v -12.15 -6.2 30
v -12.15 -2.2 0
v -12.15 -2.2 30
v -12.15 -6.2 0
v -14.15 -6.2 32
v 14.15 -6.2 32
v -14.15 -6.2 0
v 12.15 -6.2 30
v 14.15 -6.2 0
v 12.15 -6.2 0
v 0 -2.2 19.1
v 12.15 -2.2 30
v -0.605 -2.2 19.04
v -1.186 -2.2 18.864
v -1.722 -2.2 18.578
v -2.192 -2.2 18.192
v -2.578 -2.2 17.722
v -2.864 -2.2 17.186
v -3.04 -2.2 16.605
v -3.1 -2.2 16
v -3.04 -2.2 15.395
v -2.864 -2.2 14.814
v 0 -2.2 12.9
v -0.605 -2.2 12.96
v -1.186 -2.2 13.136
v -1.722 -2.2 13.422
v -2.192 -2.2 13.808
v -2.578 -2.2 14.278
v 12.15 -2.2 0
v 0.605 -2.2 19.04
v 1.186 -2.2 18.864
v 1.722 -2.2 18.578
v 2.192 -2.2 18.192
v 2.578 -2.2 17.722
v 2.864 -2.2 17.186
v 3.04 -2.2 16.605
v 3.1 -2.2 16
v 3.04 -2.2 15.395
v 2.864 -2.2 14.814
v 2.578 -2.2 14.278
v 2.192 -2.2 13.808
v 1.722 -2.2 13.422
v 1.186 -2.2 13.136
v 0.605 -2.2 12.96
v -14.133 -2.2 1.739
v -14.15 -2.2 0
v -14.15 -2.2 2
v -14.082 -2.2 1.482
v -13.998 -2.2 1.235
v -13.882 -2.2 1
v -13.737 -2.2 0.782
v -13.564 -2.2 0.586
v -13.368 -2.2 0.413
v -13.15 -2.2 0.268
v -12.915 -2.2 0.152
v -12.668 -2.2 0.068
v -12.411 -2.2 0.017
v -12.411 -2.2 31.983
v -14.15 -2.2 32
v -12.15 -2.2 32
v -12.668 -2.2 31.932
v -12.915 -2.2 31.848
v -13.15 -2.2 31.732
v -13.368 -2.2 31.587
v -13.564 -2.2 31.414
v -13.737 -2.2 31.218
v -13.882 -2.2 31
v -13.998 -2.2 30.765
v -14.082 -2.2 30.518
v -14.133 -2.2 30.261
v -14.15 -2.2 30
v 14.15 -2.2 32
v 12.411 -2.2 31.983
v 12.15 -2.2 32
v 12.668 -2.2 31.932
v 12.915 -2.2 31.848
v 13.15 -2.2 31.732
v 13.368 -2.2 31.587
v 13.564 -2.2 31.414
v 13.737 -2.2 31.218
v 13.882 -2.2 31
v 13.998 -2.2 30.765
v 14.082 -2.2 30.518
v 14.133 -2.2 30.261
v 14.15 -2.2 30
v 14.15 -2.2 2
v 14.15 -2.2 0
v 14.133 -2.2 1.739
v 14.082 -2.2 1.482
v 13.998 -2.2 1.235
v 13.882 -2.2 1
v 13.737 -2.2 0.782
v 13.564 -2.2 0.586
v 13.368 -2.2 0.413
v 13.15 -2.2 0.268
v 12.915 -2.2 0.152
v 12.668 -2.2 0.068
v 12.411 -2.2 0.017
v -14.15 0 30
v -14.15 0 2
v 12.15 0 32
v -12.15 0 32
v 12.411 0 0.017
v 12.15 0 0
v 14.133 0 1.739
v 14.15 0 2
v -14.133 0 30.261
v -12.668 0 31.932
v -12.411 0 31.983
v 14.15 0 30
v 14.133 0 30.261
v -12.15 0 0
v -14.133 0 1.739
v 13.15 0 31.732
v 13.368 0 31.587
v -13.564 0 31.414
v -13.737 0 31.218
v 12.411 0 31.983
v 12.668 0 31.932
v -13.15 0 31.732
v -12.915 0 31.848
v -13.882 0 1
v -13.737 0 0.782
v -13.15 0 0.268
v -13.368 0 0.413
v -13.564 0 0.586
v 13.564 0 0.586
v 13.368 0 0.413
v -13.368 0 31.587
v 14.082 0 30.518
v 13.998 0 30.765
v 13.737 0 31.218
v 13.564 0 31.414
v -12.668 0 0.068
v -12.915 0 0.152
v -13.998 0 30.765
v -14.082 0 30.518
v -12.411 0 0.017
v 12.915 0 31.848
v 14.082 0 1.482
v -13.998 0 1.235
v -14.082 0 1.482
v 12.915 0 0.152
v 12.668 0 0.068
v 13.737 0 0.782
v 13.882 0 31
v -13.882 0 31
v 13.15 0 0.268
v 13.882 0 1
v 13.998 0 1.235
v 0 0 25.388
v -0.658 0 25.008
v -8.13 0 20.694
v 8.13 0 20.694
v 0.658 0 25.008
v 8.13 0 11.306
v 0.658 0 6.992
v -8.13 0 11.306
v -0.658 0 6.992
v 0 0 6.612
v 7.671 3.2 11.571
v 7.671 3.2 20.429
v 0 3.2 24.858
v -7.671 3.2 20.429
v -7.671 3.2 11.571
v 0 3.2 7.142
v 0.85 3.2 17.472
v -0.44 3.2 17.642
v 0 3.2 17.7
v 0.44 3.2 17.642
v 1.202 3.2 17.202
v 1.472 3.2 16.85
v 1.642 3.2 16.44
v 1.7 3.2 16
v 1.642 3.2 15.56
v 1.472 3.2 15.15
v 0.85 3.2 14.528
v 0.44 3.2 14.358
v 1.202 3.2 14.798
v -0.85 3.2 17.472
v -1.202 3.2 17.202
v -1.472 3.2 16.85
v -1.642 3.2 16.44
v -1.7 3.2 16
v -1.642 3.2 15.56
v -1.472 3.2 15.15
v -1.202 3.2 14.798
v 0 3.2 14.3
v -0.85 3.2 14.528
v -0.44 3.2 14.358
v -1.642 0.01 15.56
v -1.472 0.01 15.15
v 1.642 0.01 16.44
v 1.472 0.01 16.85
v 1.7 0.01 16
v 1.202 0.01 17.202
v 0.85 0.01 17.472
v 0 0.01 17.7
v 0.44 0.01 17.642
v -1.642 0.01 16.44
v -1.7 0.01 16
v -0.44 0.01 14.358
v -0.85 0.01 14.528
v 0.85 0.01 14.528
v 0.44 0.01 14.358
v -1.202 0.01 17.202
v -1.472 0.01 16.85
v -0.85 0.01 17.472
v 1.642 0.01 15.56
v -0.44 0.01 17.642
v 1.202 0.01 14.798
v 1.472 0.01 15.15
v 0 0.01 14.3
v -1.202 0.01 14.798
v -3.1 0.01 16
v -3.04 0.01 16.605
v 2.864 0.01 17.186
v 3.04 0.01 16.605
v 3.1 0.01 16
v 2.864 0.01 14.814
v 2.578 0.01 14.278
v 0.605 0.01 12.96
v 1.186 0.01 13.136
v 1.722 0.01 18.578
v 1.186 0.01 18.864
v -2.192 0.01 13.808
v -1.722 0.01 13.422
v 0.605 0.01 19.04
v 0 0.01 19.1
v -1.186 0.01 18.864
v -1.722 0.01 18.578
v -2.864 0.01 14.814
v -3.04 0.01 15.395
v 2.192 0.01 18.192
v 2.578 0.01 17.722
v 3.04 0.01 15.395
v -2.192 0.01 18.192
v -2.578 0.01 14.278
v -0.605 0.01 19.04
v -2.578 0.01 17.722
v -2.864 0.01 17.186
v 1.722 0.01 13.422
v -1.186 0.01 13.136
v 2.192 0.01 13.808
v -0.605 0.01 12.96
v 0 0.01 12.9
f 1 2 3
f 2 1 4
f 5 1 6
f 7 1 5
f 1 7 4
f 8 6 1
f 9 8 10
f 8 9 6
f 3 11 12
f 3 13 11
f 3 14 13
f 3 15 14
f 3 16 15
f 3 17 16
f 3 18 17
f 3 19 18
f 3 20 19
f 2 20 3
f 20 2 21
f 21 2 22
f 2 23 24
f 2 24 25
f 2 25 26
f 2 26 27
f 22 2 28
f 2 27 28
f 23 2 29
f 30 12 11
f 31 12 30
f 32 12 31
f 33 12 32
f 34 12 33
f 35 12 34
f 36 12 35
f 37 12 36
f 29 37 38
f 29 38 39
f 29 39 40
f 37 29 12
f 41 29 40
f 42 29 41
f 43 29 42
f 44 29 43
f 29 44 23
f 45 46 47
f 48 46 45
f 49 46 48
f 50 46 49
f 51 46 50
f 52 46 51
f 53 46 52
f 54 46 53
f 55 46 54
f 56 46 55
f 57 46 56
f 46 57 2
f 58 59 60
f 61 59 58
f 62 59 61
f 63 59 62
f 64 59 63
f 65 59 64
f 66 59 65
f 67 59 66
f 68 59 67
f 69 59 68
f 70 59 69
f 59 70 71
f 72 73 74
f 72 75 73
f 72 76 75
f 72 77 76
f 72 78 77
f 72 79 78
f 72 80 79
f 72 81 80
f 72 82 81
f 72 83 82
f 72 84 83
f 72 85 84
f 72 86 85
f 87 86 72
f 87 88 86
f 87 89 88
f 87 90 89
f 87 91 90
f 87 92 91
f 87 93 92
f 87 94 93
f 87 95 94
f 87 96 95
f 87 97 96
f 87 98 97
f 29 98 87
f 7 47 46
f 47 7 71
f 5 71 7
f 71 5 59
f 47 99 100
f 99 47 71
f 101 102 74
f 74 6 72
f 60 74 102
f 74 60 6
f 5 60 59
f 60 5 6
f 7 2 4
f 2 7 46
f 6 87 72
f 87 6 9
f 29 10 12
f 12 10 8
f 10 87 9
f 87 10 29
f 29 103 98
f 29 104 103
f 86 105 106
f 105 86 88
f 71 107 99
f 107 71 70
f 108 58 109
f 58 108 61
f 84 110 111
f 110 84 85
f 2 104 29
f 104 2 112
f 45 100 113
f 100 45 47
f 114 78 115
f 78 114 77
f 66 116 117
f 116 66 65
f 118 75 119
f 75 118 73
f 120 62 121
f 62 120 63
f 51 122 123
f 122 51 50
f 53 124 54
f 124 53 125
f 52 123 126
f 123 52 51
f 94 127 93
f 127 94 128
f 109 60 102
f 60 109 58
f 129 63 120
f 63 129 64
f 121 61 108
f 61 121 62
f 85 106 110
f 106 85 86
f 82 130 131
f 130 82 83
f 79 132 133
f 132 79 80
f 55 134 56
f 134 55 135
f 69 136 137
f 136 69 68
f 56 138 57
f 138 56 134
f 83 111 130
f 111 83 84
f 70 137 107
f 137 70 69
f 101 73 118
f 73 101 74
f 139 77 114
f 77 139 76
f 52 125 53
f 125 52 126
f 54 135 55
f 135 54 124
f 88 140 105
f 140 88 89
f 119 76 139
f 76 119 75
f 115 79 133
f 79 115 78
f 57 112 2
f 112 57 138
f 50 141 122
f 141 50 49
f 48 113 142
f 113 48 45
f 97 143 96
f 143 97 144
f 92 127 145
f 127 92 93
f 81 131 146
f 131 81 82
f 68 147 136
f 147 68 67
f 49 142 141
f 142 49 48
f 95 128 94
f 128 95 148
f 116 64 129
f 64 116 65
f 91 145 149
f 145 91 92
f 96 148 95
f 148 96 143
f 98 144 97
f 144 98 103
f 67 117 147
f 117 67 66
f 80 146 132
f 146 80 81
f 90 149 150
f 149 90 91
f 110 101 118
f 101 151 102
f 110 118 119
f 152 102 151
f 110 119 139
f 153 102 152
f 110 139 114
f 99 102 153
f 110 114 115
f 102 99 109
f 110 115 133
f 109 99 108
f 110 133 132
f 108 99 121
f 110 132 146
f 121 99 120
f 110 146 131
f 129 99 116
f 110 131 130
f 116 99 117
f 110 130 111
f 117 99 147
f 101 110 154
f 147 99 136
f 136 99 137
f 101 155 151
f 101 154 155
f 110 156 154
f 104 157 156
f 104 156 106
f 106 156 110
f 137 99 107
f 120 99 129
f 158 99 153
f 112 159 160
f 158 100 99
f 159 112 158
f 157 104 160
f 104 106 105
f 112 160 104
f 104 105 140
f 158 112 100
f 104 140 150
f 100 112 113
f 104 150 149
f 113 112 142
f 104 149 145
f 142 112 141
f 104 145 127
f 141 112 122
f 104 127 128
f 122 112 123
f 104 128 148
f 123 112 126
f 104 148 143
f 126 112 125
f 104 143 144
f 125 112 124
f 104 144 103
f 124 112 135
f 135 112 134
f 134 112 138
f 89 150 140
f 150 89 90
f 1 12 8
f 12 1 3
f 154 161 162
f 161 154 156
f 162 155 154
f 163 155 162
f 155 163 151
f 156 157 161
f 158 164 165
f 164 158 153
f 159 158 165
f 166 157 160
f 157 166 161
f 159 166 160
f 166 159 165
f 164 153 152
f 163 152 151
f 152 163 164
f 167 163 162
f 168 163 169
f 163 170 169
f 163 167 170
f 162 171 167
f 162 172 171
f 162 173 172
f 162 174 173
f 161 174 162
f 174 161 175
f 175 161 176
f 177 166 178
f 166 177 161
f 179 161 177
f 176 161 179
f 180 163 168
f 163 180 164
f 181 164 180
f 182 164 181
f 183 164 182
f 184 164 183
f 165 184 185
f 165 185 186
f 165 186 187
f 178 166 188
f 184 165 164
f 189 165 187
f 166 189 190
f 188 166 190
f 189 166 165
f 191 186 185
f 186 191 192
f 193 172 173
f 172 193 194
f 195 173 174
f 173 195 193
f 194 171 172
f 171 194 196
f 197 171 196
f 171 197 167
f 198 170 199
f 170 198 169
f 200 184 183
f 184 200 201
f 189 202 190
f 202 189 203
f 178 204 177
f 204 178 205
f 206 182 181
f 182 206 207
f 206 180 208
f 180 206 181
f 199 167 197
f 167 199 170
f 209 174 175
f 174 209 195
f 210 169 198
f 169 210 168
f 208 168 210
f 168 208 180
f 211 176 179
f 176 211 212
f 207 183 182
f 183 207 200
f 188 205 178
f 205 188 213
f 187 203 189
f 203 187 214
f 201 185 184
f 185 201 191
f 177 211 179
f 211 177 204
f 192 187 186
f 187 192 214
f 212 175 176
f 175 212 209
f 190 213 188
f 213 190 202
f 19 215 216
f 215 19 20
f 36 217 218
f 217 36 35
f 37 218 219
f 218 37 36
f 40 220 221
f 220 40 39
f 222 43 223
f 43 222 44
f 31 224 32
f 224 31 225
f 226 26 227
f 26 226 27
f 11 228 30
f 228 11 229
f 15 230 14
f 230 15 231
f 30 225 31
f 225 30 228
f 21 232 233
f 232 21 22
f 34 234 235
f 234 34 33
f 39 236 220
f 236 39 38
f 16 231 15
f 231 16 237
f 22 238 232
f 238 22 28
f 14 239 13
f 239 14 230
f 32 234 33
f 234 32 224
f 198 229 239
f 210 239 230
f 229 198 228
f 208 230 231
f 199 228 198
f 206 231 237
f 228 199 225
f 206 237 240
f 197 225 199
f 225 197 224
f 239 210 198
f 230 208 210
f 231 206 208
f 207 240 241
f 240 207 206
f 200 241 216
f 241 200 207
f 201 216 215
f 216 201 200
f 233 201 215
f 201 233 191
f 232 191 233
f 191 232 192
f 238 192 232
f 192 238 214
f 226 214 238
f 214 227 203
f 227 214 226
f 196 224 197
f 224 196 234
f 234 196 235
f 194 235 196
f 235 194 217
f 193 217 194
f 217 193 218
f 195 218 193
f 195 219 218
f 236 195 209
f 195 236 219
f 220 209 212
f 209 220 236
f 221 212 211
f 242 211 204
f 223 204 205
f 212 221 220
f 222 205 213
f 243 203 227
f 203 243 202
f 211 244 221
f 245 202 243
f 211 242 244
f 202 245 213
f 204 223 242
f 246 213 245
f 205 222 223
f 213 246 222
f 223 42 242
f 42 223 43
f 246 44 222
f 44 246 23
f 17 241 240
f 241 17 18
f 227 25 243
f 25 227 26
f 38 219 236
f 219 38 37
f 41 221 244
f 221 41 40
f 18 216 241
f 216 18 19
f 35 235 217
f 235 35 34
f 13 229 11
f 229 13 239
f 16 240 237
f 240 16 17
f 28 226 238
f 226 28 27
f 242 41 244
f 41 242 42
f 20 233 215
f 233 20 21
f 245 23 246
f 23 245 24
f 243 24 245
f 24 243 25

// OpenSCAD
// file: rm_common.scad
// RobotMind V1 mechanical standard. All dimensions are millimetres.
$fn = 48;

RM_UNIT = 40;
RM_PLATE_T = 12;
RM_FIT = 0; // positive is looser; tune in 0.05 mm steps

// One carrier joint: a progressive hex press fit plus an optional M3 lock.
RM_SOCKET_DEPTH = 3.4;
RM_HEX_AF = 16;
RM_HEX_R = RM_HEX_AF/sqrt(3);
RM_HEX_TAPER = 0.28;
RM_HEX_ENTRY_CLEARANCE = 0.10+RM_FIT;
RM_HEX_GRIP = 0.20-RM_FIT;
RM_HEX_PITCH = 20;
RM_HEX_X = RM_HEX_PITCH;
RM_HEX_Y = sqrt(3)/2*RM_HEX_PITCH;

// Plate-to-plate 90° box joint: integral tabs enter open edge slots.
RM_JOIN_PITCH = 10;
RM_JOIN_LENGTH = 3.0;
RM_JOIN_W = 6;
RM_JOIN_CLEARANCE = 0.06+RM_FIT;
RM_M3_CLEARANCE = 3.4;
RM_M3_PILOT = 2.6;
RM_M3_HEAD = 6.2;
RM_M3_INSERT_HOLE = 4.0; // tune for the chosen M3 heat-set insert
RM_M3_INSERT_LENGTH = 5.0;
RM_M3_MEMBRANE = 0.3;
RM_M3_BLIND_DEPTH =
  (RM_PLATE_T-2*RM_SOCKET_DEPTH-RM_M3_MEMBRANE)/2;

assert(RM_PLATE_T > 2 * RM_SOCKET_DEPTH,
       "Plate needs a solid web between its two carrier sockets");
assert(RM_HEX_ENTRY_CLEARANCE >= 0 && RM_HEX_GRIP > 0 &&
       RM_JOIN_CLEARANCE >= 0,
       "RM_FIT is outside the printable range");
assert(RM_M3_BLIND_DEPTH > 0,
       "Plate is too thin for double-sided M3 insert pockets");
assert(2*RM_M3_BLIND_DEPTH+RM_M3_MEMBRANE >= RM_M3_INSERT_LENGTH,
       "Plate web is too thin for the M3 insert");

module rounded_box(size=[20,20,3], r=2, center=false) {
  x=size[0]; y=size[1]; z=size[2];
  translate(center ? [-x/2,-y/2,-z/2] : [0,0,0])
    linear_extrude(height=z)
      offset(r=r) offset(delta=-r) square([x,y]);
}

module print_on_x_edge(span) {
  translate([0,0,span/2]) rotate([0,90,0]) children();
}

module print_on_y_edge(span) {
  translate([0,0,span/2]) rotate([90,0,0]) children();
}

module hex_frustum(r1=RM_HEX_R, r2=RM_HEX_R, h=1) {
  rotate([0,0,30]) cylinder(r1=r1,r2=r2,h=h,$fn=6);
}

module top_socket_cut() {
  union() {
    translate([0,0,RM_PLATE_T-RM_SOCKET_DEPTH])
      hex_frustum(RM_HEX_R-RM_HEX_TAPER,
                   RM_HEX_R,
                   RM_SOCKET_DEPTH+0.1);
    translate([0,0,RM_PLATE_T-RM_SOCKET_DEPTH-RM_M3_BLIND_DEPTH])
      cylinder(h=RM_M3_BLIND_DEPTH+0.1,d=RM_M3_INSERT_HOLE,$fn=24);
  }
}

module bottom_socket_cut() {
  union() {
    translate([0,0,-0.1])
      hex_frustum(RM_HEX_R,
                   RM_HEX_R-RM_HEX_TAPER,
                   RM_SOCKET_DEPTH+0.1);
    translate([0,0,RM_SOCKET_DEPTH-0.1])
      cylinder(h=RM_M3_BLIND_DEPTH+0.1,d=RM_M3_INSERT_HOLE,$fn=24);
  }
}

module socket_pair() {
  top_socket_cut();
  bottom_socket_cut();
}

// Triangular lattice. Female edges reserve enough material for corner slots;
// the 5.5 mm origin shift keeps the 20 mm pitch and centers the usable area.
module dense_socket_grid(size=[2*RM_UNIT,2*RM_UNIT]) {
  rows=ceil(size[1]/RM_HEX_Y)+2;
  cols=ceil(size[0]/RM_HEX_X)+2;
  female_margin=RM_PLATE_T+1;
  male_margin=2;
  origin=(female_margin-male_margin)/2;
  for(row=[-rows:rows], col=[-cols:cols]) {
    y=origin+row*RM_HEX_Y;
    x=origin+(col + ((abs(row)%2)==1 ? 0.5 : 0))*RM_HEX_X;
    if(x-RM_HEX_AF/2 >= -size[0]/2+female_margin &&
       x+RM_HEX_AF/2 <= size[0]/2-male_margin &&
       y-RM_HEX_R >= -size[1]/2+female_margin &&
       y+RM_HEX_R <= size[1]/2-male_margin)
      translate([x,y,0]) socket_pair();
  }
}

function join_index(p,edge_len) =
  round((p+edge_len/2-RM_JOIN_PITCH/2)/RM_JOIN_PITCH);
function is_m3_join(p,edge_len) = join_index(p,edge_len)%4 == 1;

// Integral rectangular tabs on an A edge (+Y in local coordinates).
module male_edge(edge_len, plate_half) {
  for(p=[-edge_len/2+RM_JOIN_PITCH/2:
         RM_JOIN_PITCH:
         edge_len/2-RM_JOIN_PITCH/2])
    translate([p-RM_JOIN_W/2,plate_half-0.05,0])
      cube([RM_JOIN_W,RM_JOIN_LENGTH+0.05,RM_PLATE_T]);
}

// Blind thread-forming pilots continue through selected tabs into the edge.
module male_edge_m3_cuts(edge_len, plate_half) {
  for(p=[-edge_len/2+RM_JOIN_PITCH/2:
         RM_JOIN_PITCH:
         edge_len/2-RM_JOIN_PITCH/2])
    if(is_m3_join(p,edge_len))
      translate([p,plate_half-4,RM_PLATE_T/2])
        rotate([-90,0,0])
          cylinder(h=RM_JOIN_LENGTH+4.2,d=RM_M3_PILOT,$fn=24);
}

// Female B edge (-Y): open slots accept tabs from either face at 90°.
module female_edge_cuts(edge_len, plate_half) {
  for(p=[-edge_len/2+RM_JOIN_PITCH/2:
         RM_JOIN_PITCH:
         edge_len/2-RM_JOIN_PITCH/2]) {
    translate([p-RM_JOIN_W/2-RM_JOIN_CLEARANCE,
               -plate_half-0.1,-0.1])
      cube([RM_JOIN_W+2*RM_JOIN_CLEARANCE,
            RM_PLATE_T+RM_JOIN_CLEARANCE,
            RM_JOIN_LENGTH+0.1]);
    translate([p-RM_JOIN_W/2-RM_JOIN_CLEARANCE,
               -plate_half-0.1,RM_PLATE_T-RM_JOIN_LENGTH])
      cube([RM_JOIN_W+2*RM_JOIN_CLEARANCE,
            RM_PLATE_T+RM_JOIN_CLEARANCE,
            RM_JOIN_LENGTH+0.1]);
    if(is_m3_join(p,edge_len)) {
      translate([p,-plate_half+RM_PLATE_T/2,-0.1])
        cylinder(h=RM_PLATE_T+0.2,d=RM_M3_CLEARANCE,$fn=24);
    }
  }
}

// Identical plates: tabs on +X/+Y and 90° slots on -X/-Y.
module plate(size=[2*RM_UNIT,2*RM_UNIT]) {
  assert(size[0] % RM_UNIT == 0 && size[1] % RM_UNIT == 0,
         "Plate dimensions must be whole 40 mm units");
  difference() {
    union() {
      translate([-size[0]/2,-size[1]/2,0])
        rounded_box([size[0],size[1],RM_PLATE_T],1.5);
      male_edge(size[0],size[1]/2);
      rotate([0,0,-90]) male_edge(size[1],size[0]/2);
    }
    dense_socket_grid(size);
    female_edge_cuts(size[0],size[1]/2);
    rotate([0,0,-90]) female_edge_cuts(size[1],size[0]/2);
    male_edge_m3_cuts(size[0],size[1]/2);
    rotate([0,0,-90]) male_edge_m3_cuts(size[1],size[0]/2);
  }
}

// The tip enters freely; the last fraction of travel supplies the grip.
module integral_hex_plug() {
  translate([0,0,-RM_SOCKET_DEPTH+0.2])
    hex_frustum(RM_HEX_R-RM_HEX_TAPER-RM_HEX_ENTRY_CLEARANCE,
                 RM_HEX_R+RM_HEX_GRIP,
                 RM_SOCKET_DEPTH+0.1);
}

// Adds the universal plug. M3 is optional: the press fit works alone.
module carrier_mount() {
  difference() {
    union() {
      children();
      integral_hex_plug();
    }
    translate([0,0,-RM_SOCKET_DEPTH])
      cylinder(h=RM_SOCKET_DEPTH+100,d=RM_M3_CLEARANCE,$fn=24);
    translate([0,0,-0.01])
      cylinder(h=2.21,d=RM_M3_HEAD,$fn=32);
  }
}

module sensor_carrier(pcb=[20,20], wall=1.7, floor=1.8, clearance=0.5) {
  W=pcb[0]+2*(wall+clearance);
  L=pcb[1]+2*(wall+clearance);
  assert(W >= 2*(RM_HEX_R+RM_HEX_GRIP),
         "Carrier is narrower than its integral hex plug");
  carrier_mount() union() {
    translate([-W/2,-L/2,0]) difference() {
      rounded_box([W,L,floor+3.1],2);
      translate([wall,wall,floor])
        rounded_box([pcb[0]+2*clearance,pcb[1]+2*clearance,5],1);
      translate([W/2-6,-0.2,floor+0.5]) cube([12,wall+1,3.5]);
    }
    for(x=[-W/2+2.2,W/2-2.2], y=[-L/2+2.2,L/2-2.2])
      translate([x,y,floor+2.5]) cylinder(h=1.3,d=2.2);
  }
}

module tag_insert(tag=[60,60], border=3, t=1) {
  W=tag[0]+2*border; H=tag[1]+2*border;
  union() {
    translate([-W/2,-H/2,0]) rounded_box([W,H,t],1.2);
    translate([-8,-H/2-4,0]) rounded_box([16,5,t],1.2);
  }
}

module tag_insert_rails(tag=[60,60], border=4, rail=1.5,
                        depth=2.2, clearance=0.25, lip=0.8, lip_t=0.6) {
  W=tag[0]+2*border; H=tag[1]+2*border;
  for(sx=[-1,1]) {
    x=sx>0 ? W/2+clearance : -W/2-clearance-rail;
    translate([x,-H/2-clearance,0])
      cube([rail,H+2*clearance+rail,depth]);
    translate([sx>0 ? W/2-lip : -W/2-clearance-rail,
               -H/2-clearance,depth-lip_t])
      cube([rail+clearance+lip,H+2*clearance+rail,lip_t]);
  }
  translate([-W/2-clearance-rail,H/2+clearance,0])
    cube([W+2*(clearance+rail),rail,depth]);
}
// main file
include <rm_common.scad>

UNIT=[24,32];
CLEARANCE=0.15+RM_FIT;
BASE_T=2.2;
RAIL_T=2;
RAIL_H=4;
W=UNIT[0]+2*(CLEARANCE+RAIL_T);

module m5stack_unit_carrier() {
  carrier_mount() union() {
    translate([-W/2,-UNIT[1]/2,0]) rounded_box([W,UNIT[1],BASE_T],2);
    for(sx=[-1,1])
      translate([sx>0 ? UNIT[0]/2+CLEARANCE : -UNIT[0]/2-CLEARANCE-RAIL_T,
                 -UNIT[1]/2,BASE_T])
        cube([RAIL_T,UNIT[1],RAIL_H]);
    // One open cable end; slide the Unit against the opposite stop.
    translate([-UNIT[0]/2-CLEARANCE,UNIT[1]/2-RAIL_T,BASE_T])
      cube([UNIT[0]+2*CLEARANCE,RAIL_T,RAIL_H]);
  }
}

print_on_y_edge(UNIT[1]) m5stack_unit_carrier();
